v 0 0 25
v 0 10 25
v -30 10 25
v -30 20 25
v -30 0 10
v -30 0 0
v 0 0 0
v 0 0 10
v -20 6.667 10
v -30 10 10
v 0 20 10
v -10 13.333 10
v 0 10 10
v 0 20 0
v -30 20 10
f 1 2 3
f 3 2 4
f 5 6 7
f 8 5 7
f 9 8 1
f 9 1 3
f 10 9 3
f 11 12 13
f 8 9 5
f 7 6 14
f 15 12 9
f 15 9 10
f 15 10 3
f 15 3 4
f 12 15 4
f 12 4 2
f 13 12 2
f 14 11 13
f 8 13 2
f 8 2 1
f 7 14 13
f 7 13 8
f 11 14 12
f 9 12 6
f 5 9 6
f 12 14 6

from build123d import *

# Parameters (mm, degrees)
BOSS_EXTRUDE1_DEPTH = 10
BOSS_EXTRUDE2_DEPTH = 15


with BuildPart() as part:
    # Sketch1 → Boss-Extrude1 (new body)
    with BuildSketch(Plane.XY):
        Polygon((-30, 0), (0, 0), (0, 20), align=None)
    extrude(amount=BOSS_EXTRUDE1_DEPTH)

    # Sketch2 → Boss-Extrude2 (add)
    with BuildSketch(Plane.XY.offset(10)):
        Polygon((0, 10), (0, 0), (-30, 10), (-30, 20), align=None)
    extrude(amount=BOSS_EXTRUDE2_DEPTH)


solid = part.part
